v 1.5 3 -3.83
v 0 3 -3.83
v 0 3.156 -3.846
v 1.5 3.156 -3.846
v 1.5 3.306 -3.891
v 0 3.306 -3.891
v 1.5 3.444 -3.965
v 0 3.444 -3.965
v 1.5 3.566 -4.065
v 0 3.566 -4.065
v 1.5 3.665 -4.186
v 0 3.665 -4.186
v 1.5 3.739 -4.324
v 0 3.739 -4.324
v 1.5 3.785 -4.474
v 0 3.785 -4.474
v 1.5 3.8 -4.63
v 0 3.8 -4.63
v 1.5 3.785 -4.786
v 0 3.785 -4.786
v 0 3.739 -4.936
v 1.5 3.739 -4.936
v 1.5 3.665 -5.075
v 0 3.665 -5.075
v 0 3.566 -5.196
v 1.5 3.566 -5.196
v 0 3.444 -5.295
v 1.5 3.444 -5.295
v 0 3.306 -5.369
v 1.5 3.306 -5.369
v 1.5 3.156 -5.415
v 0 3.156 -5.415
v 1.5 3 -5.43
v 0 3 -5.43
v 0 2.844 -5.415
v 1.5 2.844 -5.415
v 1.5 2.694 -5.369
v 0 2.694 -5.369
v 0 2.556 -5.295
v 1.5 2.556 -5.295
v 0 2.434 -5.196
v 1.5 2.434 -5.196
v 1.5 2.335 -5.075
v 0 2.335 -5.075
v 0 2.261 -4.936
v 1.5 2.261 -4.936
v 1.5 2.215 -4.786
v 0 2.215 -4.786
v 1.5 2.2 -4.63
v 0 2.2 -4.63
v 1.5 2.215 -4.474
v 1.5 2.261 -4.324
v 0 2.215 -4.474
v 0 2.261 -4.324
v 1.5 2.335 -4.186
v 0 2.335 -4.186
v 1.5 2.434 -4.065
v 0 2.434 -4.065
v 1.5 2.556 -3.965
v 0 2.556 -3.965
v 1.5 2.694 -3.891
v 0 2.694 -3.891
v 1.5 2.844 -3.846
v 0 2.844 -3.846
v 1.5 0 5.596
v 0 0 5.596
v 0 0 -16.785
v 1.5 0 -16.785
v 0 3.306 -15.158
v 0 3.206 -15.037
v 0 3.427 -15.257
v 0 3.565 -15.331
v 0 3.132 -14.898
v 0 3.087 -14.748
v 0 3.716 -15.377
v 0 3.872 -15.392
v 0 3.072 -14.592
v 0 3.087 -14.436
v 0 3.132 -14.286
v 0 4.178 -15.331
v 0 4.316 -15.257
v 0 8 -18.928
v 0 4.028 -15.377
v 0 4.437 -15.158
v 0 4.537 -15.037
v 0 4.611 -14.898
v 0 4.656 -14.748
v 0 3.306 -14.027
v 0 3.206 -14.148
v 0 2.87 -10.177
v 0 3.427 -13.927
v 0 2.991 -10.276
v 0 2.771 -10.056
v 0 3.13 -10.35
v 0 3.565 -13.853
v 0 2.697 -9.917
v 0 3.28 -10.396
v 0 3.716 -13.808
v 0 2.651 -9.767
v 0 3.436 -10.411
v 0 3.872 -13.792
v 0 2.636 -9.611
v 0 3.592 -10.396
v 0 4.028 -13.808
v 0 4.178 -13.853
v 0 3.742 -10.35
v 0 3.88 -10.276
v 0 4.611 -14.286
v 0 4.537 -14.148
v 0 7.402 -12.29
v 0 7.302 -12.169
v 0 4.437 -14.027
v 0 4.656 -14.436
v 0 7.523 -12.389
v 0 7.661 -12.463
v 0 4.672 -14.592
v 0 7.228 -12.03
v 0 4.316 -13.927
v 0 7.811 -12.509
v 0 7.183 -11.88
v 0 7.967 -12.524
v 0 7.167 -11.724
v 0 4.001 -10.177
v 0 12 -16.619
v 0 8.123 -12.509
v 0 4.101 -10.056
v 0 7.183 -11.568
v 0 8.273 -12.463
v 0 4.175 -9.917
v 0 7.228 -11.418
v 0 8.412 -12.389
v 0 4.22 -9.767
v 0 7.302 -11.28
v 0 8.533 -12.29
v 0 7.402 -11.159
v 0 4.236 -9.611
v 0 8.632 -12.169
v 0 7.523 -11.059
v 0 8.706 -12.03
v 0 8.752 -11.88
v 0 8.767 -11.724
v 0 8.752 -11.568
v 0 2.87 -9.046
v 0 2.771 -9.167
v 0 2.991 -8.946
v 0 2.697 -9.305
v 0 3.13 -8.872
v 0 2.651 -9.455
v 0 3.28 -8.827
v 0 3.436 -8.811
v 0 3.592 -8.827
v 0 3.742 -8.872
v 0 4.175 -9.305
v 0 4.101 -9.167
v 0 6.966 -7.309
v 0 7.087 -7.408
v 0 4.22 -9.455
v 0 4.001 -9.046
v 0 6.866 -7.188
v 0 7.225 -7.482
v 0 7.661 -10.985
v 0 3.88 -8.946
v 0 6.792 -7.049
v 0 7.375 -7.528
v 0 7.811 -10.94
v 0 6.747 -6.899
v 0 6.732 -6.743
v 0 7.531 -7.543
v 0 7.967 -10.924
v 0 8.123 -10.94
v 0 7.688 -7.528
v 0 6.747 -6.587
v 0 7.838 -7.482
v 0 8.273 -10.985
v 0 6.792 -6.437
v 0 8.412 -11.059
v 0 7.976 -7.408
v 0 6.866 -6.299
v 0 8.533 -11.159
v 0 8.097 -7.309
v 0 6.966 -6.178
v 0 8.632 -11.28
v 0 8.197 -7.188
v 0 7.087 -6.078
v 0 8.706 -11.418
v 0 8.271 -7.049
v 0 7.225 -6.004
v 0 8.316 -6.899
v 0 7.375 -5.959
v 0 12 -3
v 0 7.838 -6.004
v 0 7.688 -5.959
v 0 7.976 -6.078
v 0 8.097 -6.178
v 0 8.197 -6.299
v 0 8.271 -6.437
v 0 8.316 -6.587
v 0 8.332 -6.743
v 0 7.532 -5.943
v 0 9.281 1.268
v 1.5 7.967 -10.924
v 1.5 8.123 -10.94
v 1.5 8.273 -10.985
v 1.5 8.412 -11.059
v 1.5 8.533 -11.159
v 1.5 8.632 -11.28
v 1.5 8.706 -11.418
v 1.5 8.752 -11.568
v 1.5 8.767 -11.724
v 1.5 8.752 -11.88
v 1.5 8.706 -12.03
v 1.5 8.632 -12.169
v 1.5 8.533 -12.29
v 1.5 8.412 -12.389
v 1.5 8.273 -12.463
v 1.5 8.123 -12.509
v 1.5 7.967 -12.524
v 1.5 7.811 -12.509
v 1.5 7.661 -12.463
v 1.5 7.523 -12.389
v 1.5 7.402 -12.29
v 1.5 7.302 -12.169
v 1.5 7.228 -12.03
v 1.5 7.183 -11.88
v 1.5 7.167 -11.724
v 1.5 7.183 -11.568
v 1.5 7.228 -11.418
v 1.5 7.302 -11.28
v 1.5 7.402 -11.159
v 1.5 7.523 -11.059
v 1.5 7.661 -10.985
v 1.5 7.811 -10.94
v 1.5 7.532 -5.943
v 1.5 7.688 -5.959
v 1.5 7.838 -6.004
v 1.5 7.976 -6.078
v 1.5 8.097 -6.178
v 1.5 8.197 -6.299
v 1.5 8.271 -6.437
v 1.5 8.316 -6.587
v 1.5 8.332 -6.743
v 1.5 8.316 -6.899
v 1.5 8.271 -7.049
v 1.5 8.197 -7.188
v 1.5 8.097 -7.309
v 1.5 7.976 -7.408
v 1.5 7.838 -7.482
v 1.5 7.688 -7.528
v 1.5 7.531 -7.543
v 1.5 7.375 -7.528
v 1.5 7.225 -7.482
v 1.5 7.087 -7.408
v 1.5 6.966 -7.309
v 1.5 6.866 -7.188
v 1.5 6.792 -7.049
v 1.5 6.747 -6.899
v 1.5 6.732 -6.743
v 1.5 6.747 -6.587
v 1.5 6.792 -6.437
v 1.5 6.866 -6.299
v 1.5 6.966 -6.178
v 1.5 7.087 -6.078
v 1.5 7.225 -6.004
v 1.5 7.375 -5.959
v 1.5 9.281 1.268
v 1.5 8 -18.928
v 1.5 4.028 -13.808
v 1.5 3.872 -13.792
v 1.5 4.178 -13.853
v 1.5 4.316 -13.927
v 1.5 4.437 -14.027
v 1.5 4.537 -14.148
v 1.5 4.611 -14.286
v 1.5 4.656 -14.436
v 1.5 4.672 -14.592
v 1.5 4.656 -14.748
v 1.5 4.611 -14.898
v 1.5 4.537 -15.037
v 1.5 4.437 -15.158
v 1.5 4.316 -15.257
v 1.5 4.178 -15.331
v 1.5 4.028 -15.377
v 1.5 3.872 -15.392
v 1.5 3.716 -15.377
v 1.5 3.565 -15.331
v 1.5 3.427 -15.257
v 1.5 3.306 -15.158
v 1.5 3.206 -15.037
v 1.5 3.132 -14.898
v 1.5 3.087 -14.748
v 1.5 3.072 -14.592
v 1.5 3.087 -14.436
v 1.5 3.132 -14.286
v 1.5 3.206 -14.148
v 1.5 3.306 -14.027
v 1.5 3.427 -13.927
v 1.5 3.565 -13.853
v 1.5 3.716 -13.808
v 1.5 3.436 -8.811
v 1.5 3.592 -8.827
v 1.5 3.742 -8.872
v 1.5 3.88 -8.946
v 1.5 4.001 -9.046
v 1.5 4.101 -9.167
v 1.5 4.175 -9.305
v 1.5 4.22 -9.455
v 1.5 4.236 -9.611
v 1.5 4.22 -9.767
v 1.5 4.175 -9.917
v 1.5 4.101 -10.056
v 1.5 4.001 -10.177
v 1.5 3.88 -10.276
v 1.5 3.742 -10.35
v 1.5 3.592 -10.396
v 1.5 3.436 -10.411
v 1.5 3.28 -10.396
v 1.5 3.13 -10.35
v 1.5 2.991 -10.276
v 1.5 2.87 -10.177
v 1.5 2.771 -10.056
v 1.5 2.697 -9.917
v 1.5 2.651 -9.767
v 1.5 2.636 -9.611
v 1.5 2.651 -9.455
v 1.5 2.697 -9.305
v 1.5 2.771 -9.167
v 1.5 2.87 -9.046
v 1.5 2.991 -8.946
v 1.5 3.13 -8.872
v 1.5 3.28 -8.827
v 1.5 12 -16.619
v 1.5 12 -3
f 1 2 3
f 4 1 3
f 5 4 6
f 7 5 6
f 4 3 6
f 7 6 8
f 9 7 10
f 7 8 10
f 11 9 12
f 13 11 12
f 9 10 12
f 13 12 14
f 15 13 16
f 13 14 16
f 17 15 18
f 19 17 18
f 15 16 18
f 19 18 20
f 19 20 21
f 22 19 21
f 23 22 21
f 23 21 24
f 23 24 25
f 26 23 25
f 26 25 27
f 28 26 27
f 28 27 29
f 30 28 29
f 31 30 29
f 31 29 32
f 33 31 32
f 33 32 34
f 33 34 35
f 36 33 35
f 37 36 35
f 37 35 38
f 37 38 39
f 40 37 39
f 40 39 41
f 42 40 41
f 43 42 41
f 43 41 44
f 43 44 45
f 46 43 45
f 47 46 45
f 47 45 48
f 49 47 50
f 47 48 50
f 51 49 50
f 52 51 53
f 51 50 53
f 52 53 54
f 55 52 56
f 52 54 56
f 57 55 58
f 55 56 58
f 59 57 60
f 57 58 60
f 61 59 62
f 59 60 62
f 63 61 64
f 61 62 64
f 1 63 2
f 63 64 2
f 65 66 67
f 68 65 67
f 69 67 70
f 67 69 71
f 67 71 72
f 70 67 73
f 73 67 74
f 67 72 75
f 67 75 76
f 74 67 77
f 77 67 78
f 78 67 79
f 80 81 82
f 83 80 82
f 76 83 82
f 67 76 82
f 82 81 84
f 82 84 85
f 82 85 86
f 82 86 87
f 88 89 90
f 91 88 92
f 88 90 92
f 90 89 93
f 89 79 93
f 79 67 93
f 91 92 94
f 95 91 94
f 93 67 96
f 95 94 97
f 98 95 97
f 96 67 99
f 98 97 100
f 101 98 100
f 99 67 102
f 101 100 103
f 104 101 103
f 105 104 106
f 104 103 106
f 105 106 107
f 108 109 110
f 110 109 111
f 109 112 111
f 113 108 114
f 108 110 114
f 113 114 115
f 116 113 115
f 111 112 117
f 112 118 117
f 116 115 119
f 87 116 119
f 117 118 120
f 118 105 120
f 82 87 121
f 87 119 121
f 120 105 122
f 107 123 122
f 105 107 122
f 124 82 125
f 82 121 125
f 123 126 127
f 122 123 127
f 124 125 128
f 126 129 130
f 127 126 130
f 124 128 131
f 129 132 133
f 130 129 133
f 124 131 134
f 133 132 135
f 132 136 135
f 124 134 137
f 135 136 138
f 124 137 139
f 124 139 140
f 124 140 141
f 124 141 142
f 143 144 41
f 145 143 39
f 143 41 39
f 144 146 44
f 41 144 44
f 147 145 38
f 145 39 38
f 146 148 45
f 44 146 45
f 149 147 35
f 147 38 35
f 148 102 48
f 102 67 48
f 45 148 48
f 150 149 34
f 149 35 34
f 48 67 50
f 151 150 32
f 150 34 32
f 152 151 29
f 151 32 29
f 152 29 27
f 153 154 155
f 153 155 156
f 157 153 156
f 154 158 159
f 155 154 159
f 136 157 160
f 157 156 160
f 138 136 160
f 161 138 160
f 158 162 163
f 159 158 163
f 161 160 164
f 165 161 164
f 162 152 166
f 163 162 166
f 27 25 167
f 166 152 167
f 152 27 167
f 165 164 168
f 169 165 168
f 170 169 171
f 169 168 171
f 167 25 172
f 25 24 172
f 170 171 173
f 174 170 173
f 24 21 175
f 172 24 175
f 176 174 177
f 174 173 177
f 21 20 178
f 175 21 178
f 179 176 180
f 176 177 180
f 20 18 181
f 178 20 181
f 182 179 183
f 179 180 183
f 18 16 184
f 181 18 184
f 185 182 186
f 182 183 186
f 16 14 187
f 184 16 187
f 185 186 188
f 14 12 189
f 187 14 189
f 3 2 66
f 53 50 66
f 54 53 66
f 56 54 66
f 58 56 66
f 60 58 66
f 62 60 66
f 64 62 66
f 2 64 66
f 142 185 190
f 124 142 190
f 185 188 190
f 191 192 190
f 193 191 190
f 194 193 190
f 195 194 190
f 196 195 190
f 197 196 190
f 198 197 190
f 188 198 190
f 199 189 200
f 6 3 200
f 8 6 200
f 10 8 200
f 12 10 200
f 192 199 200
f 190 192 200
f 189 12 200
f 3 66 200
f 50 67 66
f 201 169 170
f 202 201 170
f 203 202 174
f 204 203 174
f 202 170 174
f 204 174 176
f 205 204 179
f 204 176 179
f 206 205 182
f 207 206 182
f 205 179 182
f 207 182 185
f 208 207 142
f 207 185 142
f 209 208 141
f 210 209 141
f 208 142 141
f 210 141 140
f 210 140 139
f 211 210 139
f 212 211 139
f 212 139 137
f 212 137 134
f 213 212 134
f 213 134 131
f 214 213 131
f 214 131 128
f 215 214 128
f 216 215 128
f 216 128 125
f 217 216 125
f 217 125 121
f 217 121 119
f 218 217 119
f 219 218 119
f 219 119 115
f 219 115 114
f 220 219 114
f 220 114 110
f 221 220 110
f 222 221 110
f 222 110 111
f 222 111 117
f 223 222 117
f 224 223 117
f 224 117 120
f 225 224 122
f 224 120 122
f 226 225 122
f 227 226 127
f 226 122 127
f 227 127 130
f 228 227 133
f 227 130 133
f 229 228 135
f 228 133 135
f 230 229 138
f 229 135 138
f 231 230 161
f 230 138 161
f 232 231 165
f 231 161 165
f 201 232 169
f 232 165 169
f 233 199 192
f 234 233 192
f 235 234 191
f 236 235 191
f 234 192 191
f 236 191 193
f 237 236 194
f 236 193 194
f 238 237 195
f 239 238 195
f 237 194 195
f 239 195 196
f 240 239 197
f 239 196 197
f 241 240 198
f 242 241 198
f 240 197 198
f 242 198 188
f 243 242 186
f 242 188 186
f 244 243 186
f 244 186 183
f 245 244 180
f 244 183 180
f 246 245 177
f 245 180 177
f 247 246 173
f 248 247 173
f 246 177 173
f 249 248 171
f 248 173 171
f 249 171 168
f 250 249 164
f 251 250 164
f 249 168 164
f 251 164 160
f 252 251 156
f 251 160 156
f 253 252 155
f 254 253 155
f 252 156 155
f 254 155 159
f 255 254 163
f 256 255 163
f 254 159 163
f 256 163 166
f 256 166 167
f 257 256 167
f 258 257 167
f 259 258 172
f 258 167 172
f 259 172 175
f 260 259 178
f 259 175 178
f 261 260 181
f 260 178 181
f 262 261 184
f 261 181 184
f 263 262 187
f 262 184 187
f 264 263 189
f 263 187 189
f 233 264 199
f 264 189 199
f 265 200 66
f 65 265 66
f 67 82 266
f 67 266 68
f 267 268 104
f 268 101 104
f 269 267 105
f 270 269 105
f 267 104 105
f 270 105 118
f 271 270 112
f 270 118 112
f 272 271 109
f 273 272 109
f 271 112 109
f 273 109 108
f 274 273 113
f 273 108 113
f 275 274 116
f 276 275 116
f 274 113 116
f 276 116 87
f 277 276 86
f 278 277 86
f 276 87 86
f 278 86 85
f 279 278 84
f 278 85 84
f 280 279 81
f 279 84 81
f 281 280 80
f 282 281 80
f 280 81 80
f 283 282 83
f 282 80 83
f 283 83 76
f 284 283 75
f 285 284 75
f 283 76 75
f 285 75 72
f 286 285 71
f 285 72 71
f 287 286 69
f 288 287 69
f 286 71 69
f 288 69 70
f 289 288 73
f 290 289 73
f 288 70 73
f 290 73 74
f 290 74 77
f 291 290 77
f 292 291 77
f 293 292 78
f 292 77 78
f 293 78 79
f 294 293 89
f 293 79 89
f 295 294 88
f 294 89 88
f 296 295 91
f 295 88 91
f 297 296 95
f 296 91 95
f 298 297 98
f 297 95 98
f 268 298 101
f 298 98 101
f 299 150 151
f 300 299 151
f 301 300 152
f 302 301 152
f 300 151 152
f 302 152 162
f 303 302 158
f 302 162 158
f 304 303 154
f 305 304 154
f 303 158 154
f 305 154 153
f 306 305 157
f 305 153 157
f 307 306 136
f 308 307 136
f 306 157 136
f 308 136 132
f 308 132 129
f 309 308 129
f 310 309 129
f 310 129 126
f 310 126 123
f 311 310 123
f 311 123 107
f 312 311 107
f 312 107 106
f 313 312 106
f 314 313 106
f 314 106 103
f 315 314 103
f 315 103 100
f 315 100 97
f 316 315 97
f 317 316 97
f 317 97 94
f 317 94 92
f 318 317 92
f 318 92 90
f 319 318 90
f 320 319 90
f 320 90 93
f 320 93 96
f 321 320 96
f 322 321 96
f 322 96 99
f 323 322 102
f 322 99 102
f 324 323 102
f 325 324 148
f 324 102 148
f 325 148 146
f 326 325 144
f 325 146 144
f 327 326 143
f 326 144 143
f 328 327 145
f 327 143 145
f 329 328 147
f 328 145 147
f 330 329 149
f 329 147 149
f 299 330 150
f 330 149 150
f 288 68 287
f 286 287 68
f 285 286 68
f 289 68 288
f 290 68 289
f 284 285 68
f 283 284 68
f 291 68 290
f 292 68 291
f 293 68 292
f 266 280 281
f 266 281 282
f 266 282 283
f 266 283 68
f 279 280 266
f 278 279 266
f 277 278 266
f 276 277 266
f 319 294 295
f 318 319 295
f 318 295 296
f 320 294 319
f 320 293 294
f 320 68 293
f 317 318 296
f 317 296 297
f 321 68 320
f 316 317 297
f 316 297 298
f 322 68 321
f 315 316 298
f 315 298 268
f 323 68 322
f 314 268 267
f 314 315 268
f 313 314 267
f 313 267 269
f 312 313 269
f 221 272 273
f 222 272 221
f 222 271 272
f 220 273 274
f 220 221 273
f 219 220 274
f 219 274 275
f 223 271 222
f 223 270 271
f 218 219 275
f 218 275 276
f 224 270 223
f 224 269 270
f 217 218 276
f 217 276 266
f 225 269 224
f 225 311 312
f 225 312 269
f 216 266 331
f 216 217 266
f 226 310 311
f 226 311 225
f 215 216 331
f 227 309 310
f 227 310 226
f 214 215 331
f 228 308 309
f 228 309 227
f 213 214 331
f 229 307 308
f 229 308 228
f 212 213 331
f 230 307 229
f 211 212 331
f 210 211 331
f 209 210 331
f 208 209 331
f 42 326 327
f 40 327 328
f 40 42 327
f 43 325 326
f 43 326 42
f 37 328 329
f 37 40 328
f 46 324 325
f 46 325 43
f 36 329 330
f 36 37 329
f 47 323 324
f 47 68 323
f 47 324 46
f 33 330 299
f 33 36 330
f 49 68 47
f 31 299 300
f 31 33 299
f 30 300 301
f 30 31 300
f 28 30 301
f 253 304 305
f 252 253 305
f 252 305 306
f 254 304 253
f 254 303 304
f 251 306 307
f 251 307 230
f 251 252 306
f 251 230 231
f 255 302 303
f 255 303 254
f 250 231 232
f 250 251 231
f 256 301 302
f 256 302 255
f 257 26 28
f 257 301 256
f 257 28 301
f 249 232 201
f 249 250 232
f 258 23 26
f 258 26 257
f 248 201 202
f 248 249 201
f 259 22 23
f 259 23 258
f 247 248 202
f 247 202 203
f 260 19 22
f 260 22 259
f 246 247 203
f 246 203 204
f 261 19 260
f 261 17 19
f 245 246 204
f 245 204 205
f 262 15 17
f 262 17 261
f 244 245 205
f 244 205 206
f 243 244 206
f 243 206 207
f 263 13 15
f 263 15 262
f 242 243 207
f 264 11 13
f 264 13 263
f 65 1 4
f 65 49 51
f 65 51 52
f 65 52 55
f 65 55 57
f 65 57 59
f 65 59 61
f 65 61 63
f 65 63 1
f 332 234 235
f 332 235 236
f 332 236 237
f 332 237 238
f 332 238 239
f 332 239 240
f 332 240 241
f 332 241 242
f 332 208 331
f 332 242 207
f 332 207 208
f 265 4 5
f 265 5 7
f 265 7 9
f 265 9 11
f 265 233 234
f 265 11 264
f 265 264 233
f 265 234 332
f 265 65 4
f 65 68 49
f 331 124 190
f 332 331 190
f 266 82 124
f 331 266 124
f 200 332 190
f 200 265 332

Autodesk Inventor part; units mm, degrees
ref_plane "YZ Plane" through (0, 0, 0) normal (1, 0, 0) x (0, 1, 0)
ref_plane "XZ Plane" through (0, 0, 0) normal (0, 1, 0) x (-1, 0, 0)
ref_plane "XY Plane" through (0, 0, 0) normal (0, 0, 1) x (1, 0, 0)
sketch "スケッチ1" plane through (0, 0, 0) normal (1, 0, 0) x (0, 1, 0)
  line L0 (12, 0) -> (0, 0)
  line L1 (0, 0) -> (0, -25)
  line L2 (0, -25) -> (12, -25)
  line L3 (12, -25) -> (12, 0)
  line L4 (12, 0) -> (0, 5.5957)
  line L5 (0, 5.5957) -> (0, 0)
  line L6 (12, -20) -> (0, -16.7846)
  line L7 (8, -18.9282) -> (12, -16.6188)
  dimension "d11" = 12
  dimension "d12" = 25
  dimension "d14" = 25
  dimension "d15" = 15
  dimension "d16" = 5
  dimension "d17" = 45
  dimension "d18" = 4
extrude "プレート1" add sketch "スケッチ1" along normal blind 1.5 contours L3 L7 L6 L1 L0 | L0 L5 L4
sketch "スケッチ3" plane through (0, 0, 0) normal (-1, 0, 0) x (0, 0, 1)
  circle A0 centre (-6.7433, 7.5315) radius 0.8
  circle A1 centre (-14.5922, 3.8716) radius 0.8
  circle A2 centre (-9.6112, 3.4358) radius 0.8
  circle A3 centre (-4.6303, 3) radius 0.8
  line L0 (-14.5922, 3.8716) -> (-9.6112, 3.4358) construction
  line L1 (-9.6112, 3.4358) -> (-4.6303, 3) construction
  line L2 (-6.7433, 7.5315) -> (-4.6303, 3) construction
  line L3 (0, 12) -> (5.5957, 0) projected
  line L4 (-6.7433, 7.5315) -> (-7.1207, 3.2179) construction
  line L5 (-11.7243, 7.9673) -> (-12.1017, 3.6537) construction
  line L6 (-11.7243, 7.9673) -> (-6.7433, 7.5315) construction
  circle A4 centre (-11.7243, 7.9673) radius 0.8
  line L7 (-6.7433, 7.5315) -> (-4.8683, 8.4059) construction
  line L8 (5.5957, 0) -> (-16.7846, 0) projected
  point P0 (0, 0)
  dimension "d23" = 1.6
  dimension "d26" = 5
  dimension "d29" = 5
  dimension "d30" = 8
  dimension "d31" = 3
extrude "切り取り1" cut sketch "スケッチ3" against normal blind 1.5
chamfer "面取り1" distance 3 angle 45 1 edges at (0.75, 12, 0)
equation "\"d29\" = d26"
equation "\"d32\" = Thickness"
equation "\"d0\" = Thickness"
equation "\"BendRadius\" = Thickness"
equation "\"BendReliefWidth\" = Thickness"
equation "\"BendReliefDepth\" = 0.5 * Thickness"
equation "\"CornerReliefSize\" = 4 * Thickness"
equation "\"MinimumRemnant\" = 2 * Thickness"
equation "\"TransitionRadius\" = BendRadius"
equation "\"JacobiRadiusSize\" = BendRadius"
equation "\"GapSize\" = Thickness"
equation "\"Thickness\" = 1.5"
properties part number "face_gard_right" material "アルミニウム 6061"
